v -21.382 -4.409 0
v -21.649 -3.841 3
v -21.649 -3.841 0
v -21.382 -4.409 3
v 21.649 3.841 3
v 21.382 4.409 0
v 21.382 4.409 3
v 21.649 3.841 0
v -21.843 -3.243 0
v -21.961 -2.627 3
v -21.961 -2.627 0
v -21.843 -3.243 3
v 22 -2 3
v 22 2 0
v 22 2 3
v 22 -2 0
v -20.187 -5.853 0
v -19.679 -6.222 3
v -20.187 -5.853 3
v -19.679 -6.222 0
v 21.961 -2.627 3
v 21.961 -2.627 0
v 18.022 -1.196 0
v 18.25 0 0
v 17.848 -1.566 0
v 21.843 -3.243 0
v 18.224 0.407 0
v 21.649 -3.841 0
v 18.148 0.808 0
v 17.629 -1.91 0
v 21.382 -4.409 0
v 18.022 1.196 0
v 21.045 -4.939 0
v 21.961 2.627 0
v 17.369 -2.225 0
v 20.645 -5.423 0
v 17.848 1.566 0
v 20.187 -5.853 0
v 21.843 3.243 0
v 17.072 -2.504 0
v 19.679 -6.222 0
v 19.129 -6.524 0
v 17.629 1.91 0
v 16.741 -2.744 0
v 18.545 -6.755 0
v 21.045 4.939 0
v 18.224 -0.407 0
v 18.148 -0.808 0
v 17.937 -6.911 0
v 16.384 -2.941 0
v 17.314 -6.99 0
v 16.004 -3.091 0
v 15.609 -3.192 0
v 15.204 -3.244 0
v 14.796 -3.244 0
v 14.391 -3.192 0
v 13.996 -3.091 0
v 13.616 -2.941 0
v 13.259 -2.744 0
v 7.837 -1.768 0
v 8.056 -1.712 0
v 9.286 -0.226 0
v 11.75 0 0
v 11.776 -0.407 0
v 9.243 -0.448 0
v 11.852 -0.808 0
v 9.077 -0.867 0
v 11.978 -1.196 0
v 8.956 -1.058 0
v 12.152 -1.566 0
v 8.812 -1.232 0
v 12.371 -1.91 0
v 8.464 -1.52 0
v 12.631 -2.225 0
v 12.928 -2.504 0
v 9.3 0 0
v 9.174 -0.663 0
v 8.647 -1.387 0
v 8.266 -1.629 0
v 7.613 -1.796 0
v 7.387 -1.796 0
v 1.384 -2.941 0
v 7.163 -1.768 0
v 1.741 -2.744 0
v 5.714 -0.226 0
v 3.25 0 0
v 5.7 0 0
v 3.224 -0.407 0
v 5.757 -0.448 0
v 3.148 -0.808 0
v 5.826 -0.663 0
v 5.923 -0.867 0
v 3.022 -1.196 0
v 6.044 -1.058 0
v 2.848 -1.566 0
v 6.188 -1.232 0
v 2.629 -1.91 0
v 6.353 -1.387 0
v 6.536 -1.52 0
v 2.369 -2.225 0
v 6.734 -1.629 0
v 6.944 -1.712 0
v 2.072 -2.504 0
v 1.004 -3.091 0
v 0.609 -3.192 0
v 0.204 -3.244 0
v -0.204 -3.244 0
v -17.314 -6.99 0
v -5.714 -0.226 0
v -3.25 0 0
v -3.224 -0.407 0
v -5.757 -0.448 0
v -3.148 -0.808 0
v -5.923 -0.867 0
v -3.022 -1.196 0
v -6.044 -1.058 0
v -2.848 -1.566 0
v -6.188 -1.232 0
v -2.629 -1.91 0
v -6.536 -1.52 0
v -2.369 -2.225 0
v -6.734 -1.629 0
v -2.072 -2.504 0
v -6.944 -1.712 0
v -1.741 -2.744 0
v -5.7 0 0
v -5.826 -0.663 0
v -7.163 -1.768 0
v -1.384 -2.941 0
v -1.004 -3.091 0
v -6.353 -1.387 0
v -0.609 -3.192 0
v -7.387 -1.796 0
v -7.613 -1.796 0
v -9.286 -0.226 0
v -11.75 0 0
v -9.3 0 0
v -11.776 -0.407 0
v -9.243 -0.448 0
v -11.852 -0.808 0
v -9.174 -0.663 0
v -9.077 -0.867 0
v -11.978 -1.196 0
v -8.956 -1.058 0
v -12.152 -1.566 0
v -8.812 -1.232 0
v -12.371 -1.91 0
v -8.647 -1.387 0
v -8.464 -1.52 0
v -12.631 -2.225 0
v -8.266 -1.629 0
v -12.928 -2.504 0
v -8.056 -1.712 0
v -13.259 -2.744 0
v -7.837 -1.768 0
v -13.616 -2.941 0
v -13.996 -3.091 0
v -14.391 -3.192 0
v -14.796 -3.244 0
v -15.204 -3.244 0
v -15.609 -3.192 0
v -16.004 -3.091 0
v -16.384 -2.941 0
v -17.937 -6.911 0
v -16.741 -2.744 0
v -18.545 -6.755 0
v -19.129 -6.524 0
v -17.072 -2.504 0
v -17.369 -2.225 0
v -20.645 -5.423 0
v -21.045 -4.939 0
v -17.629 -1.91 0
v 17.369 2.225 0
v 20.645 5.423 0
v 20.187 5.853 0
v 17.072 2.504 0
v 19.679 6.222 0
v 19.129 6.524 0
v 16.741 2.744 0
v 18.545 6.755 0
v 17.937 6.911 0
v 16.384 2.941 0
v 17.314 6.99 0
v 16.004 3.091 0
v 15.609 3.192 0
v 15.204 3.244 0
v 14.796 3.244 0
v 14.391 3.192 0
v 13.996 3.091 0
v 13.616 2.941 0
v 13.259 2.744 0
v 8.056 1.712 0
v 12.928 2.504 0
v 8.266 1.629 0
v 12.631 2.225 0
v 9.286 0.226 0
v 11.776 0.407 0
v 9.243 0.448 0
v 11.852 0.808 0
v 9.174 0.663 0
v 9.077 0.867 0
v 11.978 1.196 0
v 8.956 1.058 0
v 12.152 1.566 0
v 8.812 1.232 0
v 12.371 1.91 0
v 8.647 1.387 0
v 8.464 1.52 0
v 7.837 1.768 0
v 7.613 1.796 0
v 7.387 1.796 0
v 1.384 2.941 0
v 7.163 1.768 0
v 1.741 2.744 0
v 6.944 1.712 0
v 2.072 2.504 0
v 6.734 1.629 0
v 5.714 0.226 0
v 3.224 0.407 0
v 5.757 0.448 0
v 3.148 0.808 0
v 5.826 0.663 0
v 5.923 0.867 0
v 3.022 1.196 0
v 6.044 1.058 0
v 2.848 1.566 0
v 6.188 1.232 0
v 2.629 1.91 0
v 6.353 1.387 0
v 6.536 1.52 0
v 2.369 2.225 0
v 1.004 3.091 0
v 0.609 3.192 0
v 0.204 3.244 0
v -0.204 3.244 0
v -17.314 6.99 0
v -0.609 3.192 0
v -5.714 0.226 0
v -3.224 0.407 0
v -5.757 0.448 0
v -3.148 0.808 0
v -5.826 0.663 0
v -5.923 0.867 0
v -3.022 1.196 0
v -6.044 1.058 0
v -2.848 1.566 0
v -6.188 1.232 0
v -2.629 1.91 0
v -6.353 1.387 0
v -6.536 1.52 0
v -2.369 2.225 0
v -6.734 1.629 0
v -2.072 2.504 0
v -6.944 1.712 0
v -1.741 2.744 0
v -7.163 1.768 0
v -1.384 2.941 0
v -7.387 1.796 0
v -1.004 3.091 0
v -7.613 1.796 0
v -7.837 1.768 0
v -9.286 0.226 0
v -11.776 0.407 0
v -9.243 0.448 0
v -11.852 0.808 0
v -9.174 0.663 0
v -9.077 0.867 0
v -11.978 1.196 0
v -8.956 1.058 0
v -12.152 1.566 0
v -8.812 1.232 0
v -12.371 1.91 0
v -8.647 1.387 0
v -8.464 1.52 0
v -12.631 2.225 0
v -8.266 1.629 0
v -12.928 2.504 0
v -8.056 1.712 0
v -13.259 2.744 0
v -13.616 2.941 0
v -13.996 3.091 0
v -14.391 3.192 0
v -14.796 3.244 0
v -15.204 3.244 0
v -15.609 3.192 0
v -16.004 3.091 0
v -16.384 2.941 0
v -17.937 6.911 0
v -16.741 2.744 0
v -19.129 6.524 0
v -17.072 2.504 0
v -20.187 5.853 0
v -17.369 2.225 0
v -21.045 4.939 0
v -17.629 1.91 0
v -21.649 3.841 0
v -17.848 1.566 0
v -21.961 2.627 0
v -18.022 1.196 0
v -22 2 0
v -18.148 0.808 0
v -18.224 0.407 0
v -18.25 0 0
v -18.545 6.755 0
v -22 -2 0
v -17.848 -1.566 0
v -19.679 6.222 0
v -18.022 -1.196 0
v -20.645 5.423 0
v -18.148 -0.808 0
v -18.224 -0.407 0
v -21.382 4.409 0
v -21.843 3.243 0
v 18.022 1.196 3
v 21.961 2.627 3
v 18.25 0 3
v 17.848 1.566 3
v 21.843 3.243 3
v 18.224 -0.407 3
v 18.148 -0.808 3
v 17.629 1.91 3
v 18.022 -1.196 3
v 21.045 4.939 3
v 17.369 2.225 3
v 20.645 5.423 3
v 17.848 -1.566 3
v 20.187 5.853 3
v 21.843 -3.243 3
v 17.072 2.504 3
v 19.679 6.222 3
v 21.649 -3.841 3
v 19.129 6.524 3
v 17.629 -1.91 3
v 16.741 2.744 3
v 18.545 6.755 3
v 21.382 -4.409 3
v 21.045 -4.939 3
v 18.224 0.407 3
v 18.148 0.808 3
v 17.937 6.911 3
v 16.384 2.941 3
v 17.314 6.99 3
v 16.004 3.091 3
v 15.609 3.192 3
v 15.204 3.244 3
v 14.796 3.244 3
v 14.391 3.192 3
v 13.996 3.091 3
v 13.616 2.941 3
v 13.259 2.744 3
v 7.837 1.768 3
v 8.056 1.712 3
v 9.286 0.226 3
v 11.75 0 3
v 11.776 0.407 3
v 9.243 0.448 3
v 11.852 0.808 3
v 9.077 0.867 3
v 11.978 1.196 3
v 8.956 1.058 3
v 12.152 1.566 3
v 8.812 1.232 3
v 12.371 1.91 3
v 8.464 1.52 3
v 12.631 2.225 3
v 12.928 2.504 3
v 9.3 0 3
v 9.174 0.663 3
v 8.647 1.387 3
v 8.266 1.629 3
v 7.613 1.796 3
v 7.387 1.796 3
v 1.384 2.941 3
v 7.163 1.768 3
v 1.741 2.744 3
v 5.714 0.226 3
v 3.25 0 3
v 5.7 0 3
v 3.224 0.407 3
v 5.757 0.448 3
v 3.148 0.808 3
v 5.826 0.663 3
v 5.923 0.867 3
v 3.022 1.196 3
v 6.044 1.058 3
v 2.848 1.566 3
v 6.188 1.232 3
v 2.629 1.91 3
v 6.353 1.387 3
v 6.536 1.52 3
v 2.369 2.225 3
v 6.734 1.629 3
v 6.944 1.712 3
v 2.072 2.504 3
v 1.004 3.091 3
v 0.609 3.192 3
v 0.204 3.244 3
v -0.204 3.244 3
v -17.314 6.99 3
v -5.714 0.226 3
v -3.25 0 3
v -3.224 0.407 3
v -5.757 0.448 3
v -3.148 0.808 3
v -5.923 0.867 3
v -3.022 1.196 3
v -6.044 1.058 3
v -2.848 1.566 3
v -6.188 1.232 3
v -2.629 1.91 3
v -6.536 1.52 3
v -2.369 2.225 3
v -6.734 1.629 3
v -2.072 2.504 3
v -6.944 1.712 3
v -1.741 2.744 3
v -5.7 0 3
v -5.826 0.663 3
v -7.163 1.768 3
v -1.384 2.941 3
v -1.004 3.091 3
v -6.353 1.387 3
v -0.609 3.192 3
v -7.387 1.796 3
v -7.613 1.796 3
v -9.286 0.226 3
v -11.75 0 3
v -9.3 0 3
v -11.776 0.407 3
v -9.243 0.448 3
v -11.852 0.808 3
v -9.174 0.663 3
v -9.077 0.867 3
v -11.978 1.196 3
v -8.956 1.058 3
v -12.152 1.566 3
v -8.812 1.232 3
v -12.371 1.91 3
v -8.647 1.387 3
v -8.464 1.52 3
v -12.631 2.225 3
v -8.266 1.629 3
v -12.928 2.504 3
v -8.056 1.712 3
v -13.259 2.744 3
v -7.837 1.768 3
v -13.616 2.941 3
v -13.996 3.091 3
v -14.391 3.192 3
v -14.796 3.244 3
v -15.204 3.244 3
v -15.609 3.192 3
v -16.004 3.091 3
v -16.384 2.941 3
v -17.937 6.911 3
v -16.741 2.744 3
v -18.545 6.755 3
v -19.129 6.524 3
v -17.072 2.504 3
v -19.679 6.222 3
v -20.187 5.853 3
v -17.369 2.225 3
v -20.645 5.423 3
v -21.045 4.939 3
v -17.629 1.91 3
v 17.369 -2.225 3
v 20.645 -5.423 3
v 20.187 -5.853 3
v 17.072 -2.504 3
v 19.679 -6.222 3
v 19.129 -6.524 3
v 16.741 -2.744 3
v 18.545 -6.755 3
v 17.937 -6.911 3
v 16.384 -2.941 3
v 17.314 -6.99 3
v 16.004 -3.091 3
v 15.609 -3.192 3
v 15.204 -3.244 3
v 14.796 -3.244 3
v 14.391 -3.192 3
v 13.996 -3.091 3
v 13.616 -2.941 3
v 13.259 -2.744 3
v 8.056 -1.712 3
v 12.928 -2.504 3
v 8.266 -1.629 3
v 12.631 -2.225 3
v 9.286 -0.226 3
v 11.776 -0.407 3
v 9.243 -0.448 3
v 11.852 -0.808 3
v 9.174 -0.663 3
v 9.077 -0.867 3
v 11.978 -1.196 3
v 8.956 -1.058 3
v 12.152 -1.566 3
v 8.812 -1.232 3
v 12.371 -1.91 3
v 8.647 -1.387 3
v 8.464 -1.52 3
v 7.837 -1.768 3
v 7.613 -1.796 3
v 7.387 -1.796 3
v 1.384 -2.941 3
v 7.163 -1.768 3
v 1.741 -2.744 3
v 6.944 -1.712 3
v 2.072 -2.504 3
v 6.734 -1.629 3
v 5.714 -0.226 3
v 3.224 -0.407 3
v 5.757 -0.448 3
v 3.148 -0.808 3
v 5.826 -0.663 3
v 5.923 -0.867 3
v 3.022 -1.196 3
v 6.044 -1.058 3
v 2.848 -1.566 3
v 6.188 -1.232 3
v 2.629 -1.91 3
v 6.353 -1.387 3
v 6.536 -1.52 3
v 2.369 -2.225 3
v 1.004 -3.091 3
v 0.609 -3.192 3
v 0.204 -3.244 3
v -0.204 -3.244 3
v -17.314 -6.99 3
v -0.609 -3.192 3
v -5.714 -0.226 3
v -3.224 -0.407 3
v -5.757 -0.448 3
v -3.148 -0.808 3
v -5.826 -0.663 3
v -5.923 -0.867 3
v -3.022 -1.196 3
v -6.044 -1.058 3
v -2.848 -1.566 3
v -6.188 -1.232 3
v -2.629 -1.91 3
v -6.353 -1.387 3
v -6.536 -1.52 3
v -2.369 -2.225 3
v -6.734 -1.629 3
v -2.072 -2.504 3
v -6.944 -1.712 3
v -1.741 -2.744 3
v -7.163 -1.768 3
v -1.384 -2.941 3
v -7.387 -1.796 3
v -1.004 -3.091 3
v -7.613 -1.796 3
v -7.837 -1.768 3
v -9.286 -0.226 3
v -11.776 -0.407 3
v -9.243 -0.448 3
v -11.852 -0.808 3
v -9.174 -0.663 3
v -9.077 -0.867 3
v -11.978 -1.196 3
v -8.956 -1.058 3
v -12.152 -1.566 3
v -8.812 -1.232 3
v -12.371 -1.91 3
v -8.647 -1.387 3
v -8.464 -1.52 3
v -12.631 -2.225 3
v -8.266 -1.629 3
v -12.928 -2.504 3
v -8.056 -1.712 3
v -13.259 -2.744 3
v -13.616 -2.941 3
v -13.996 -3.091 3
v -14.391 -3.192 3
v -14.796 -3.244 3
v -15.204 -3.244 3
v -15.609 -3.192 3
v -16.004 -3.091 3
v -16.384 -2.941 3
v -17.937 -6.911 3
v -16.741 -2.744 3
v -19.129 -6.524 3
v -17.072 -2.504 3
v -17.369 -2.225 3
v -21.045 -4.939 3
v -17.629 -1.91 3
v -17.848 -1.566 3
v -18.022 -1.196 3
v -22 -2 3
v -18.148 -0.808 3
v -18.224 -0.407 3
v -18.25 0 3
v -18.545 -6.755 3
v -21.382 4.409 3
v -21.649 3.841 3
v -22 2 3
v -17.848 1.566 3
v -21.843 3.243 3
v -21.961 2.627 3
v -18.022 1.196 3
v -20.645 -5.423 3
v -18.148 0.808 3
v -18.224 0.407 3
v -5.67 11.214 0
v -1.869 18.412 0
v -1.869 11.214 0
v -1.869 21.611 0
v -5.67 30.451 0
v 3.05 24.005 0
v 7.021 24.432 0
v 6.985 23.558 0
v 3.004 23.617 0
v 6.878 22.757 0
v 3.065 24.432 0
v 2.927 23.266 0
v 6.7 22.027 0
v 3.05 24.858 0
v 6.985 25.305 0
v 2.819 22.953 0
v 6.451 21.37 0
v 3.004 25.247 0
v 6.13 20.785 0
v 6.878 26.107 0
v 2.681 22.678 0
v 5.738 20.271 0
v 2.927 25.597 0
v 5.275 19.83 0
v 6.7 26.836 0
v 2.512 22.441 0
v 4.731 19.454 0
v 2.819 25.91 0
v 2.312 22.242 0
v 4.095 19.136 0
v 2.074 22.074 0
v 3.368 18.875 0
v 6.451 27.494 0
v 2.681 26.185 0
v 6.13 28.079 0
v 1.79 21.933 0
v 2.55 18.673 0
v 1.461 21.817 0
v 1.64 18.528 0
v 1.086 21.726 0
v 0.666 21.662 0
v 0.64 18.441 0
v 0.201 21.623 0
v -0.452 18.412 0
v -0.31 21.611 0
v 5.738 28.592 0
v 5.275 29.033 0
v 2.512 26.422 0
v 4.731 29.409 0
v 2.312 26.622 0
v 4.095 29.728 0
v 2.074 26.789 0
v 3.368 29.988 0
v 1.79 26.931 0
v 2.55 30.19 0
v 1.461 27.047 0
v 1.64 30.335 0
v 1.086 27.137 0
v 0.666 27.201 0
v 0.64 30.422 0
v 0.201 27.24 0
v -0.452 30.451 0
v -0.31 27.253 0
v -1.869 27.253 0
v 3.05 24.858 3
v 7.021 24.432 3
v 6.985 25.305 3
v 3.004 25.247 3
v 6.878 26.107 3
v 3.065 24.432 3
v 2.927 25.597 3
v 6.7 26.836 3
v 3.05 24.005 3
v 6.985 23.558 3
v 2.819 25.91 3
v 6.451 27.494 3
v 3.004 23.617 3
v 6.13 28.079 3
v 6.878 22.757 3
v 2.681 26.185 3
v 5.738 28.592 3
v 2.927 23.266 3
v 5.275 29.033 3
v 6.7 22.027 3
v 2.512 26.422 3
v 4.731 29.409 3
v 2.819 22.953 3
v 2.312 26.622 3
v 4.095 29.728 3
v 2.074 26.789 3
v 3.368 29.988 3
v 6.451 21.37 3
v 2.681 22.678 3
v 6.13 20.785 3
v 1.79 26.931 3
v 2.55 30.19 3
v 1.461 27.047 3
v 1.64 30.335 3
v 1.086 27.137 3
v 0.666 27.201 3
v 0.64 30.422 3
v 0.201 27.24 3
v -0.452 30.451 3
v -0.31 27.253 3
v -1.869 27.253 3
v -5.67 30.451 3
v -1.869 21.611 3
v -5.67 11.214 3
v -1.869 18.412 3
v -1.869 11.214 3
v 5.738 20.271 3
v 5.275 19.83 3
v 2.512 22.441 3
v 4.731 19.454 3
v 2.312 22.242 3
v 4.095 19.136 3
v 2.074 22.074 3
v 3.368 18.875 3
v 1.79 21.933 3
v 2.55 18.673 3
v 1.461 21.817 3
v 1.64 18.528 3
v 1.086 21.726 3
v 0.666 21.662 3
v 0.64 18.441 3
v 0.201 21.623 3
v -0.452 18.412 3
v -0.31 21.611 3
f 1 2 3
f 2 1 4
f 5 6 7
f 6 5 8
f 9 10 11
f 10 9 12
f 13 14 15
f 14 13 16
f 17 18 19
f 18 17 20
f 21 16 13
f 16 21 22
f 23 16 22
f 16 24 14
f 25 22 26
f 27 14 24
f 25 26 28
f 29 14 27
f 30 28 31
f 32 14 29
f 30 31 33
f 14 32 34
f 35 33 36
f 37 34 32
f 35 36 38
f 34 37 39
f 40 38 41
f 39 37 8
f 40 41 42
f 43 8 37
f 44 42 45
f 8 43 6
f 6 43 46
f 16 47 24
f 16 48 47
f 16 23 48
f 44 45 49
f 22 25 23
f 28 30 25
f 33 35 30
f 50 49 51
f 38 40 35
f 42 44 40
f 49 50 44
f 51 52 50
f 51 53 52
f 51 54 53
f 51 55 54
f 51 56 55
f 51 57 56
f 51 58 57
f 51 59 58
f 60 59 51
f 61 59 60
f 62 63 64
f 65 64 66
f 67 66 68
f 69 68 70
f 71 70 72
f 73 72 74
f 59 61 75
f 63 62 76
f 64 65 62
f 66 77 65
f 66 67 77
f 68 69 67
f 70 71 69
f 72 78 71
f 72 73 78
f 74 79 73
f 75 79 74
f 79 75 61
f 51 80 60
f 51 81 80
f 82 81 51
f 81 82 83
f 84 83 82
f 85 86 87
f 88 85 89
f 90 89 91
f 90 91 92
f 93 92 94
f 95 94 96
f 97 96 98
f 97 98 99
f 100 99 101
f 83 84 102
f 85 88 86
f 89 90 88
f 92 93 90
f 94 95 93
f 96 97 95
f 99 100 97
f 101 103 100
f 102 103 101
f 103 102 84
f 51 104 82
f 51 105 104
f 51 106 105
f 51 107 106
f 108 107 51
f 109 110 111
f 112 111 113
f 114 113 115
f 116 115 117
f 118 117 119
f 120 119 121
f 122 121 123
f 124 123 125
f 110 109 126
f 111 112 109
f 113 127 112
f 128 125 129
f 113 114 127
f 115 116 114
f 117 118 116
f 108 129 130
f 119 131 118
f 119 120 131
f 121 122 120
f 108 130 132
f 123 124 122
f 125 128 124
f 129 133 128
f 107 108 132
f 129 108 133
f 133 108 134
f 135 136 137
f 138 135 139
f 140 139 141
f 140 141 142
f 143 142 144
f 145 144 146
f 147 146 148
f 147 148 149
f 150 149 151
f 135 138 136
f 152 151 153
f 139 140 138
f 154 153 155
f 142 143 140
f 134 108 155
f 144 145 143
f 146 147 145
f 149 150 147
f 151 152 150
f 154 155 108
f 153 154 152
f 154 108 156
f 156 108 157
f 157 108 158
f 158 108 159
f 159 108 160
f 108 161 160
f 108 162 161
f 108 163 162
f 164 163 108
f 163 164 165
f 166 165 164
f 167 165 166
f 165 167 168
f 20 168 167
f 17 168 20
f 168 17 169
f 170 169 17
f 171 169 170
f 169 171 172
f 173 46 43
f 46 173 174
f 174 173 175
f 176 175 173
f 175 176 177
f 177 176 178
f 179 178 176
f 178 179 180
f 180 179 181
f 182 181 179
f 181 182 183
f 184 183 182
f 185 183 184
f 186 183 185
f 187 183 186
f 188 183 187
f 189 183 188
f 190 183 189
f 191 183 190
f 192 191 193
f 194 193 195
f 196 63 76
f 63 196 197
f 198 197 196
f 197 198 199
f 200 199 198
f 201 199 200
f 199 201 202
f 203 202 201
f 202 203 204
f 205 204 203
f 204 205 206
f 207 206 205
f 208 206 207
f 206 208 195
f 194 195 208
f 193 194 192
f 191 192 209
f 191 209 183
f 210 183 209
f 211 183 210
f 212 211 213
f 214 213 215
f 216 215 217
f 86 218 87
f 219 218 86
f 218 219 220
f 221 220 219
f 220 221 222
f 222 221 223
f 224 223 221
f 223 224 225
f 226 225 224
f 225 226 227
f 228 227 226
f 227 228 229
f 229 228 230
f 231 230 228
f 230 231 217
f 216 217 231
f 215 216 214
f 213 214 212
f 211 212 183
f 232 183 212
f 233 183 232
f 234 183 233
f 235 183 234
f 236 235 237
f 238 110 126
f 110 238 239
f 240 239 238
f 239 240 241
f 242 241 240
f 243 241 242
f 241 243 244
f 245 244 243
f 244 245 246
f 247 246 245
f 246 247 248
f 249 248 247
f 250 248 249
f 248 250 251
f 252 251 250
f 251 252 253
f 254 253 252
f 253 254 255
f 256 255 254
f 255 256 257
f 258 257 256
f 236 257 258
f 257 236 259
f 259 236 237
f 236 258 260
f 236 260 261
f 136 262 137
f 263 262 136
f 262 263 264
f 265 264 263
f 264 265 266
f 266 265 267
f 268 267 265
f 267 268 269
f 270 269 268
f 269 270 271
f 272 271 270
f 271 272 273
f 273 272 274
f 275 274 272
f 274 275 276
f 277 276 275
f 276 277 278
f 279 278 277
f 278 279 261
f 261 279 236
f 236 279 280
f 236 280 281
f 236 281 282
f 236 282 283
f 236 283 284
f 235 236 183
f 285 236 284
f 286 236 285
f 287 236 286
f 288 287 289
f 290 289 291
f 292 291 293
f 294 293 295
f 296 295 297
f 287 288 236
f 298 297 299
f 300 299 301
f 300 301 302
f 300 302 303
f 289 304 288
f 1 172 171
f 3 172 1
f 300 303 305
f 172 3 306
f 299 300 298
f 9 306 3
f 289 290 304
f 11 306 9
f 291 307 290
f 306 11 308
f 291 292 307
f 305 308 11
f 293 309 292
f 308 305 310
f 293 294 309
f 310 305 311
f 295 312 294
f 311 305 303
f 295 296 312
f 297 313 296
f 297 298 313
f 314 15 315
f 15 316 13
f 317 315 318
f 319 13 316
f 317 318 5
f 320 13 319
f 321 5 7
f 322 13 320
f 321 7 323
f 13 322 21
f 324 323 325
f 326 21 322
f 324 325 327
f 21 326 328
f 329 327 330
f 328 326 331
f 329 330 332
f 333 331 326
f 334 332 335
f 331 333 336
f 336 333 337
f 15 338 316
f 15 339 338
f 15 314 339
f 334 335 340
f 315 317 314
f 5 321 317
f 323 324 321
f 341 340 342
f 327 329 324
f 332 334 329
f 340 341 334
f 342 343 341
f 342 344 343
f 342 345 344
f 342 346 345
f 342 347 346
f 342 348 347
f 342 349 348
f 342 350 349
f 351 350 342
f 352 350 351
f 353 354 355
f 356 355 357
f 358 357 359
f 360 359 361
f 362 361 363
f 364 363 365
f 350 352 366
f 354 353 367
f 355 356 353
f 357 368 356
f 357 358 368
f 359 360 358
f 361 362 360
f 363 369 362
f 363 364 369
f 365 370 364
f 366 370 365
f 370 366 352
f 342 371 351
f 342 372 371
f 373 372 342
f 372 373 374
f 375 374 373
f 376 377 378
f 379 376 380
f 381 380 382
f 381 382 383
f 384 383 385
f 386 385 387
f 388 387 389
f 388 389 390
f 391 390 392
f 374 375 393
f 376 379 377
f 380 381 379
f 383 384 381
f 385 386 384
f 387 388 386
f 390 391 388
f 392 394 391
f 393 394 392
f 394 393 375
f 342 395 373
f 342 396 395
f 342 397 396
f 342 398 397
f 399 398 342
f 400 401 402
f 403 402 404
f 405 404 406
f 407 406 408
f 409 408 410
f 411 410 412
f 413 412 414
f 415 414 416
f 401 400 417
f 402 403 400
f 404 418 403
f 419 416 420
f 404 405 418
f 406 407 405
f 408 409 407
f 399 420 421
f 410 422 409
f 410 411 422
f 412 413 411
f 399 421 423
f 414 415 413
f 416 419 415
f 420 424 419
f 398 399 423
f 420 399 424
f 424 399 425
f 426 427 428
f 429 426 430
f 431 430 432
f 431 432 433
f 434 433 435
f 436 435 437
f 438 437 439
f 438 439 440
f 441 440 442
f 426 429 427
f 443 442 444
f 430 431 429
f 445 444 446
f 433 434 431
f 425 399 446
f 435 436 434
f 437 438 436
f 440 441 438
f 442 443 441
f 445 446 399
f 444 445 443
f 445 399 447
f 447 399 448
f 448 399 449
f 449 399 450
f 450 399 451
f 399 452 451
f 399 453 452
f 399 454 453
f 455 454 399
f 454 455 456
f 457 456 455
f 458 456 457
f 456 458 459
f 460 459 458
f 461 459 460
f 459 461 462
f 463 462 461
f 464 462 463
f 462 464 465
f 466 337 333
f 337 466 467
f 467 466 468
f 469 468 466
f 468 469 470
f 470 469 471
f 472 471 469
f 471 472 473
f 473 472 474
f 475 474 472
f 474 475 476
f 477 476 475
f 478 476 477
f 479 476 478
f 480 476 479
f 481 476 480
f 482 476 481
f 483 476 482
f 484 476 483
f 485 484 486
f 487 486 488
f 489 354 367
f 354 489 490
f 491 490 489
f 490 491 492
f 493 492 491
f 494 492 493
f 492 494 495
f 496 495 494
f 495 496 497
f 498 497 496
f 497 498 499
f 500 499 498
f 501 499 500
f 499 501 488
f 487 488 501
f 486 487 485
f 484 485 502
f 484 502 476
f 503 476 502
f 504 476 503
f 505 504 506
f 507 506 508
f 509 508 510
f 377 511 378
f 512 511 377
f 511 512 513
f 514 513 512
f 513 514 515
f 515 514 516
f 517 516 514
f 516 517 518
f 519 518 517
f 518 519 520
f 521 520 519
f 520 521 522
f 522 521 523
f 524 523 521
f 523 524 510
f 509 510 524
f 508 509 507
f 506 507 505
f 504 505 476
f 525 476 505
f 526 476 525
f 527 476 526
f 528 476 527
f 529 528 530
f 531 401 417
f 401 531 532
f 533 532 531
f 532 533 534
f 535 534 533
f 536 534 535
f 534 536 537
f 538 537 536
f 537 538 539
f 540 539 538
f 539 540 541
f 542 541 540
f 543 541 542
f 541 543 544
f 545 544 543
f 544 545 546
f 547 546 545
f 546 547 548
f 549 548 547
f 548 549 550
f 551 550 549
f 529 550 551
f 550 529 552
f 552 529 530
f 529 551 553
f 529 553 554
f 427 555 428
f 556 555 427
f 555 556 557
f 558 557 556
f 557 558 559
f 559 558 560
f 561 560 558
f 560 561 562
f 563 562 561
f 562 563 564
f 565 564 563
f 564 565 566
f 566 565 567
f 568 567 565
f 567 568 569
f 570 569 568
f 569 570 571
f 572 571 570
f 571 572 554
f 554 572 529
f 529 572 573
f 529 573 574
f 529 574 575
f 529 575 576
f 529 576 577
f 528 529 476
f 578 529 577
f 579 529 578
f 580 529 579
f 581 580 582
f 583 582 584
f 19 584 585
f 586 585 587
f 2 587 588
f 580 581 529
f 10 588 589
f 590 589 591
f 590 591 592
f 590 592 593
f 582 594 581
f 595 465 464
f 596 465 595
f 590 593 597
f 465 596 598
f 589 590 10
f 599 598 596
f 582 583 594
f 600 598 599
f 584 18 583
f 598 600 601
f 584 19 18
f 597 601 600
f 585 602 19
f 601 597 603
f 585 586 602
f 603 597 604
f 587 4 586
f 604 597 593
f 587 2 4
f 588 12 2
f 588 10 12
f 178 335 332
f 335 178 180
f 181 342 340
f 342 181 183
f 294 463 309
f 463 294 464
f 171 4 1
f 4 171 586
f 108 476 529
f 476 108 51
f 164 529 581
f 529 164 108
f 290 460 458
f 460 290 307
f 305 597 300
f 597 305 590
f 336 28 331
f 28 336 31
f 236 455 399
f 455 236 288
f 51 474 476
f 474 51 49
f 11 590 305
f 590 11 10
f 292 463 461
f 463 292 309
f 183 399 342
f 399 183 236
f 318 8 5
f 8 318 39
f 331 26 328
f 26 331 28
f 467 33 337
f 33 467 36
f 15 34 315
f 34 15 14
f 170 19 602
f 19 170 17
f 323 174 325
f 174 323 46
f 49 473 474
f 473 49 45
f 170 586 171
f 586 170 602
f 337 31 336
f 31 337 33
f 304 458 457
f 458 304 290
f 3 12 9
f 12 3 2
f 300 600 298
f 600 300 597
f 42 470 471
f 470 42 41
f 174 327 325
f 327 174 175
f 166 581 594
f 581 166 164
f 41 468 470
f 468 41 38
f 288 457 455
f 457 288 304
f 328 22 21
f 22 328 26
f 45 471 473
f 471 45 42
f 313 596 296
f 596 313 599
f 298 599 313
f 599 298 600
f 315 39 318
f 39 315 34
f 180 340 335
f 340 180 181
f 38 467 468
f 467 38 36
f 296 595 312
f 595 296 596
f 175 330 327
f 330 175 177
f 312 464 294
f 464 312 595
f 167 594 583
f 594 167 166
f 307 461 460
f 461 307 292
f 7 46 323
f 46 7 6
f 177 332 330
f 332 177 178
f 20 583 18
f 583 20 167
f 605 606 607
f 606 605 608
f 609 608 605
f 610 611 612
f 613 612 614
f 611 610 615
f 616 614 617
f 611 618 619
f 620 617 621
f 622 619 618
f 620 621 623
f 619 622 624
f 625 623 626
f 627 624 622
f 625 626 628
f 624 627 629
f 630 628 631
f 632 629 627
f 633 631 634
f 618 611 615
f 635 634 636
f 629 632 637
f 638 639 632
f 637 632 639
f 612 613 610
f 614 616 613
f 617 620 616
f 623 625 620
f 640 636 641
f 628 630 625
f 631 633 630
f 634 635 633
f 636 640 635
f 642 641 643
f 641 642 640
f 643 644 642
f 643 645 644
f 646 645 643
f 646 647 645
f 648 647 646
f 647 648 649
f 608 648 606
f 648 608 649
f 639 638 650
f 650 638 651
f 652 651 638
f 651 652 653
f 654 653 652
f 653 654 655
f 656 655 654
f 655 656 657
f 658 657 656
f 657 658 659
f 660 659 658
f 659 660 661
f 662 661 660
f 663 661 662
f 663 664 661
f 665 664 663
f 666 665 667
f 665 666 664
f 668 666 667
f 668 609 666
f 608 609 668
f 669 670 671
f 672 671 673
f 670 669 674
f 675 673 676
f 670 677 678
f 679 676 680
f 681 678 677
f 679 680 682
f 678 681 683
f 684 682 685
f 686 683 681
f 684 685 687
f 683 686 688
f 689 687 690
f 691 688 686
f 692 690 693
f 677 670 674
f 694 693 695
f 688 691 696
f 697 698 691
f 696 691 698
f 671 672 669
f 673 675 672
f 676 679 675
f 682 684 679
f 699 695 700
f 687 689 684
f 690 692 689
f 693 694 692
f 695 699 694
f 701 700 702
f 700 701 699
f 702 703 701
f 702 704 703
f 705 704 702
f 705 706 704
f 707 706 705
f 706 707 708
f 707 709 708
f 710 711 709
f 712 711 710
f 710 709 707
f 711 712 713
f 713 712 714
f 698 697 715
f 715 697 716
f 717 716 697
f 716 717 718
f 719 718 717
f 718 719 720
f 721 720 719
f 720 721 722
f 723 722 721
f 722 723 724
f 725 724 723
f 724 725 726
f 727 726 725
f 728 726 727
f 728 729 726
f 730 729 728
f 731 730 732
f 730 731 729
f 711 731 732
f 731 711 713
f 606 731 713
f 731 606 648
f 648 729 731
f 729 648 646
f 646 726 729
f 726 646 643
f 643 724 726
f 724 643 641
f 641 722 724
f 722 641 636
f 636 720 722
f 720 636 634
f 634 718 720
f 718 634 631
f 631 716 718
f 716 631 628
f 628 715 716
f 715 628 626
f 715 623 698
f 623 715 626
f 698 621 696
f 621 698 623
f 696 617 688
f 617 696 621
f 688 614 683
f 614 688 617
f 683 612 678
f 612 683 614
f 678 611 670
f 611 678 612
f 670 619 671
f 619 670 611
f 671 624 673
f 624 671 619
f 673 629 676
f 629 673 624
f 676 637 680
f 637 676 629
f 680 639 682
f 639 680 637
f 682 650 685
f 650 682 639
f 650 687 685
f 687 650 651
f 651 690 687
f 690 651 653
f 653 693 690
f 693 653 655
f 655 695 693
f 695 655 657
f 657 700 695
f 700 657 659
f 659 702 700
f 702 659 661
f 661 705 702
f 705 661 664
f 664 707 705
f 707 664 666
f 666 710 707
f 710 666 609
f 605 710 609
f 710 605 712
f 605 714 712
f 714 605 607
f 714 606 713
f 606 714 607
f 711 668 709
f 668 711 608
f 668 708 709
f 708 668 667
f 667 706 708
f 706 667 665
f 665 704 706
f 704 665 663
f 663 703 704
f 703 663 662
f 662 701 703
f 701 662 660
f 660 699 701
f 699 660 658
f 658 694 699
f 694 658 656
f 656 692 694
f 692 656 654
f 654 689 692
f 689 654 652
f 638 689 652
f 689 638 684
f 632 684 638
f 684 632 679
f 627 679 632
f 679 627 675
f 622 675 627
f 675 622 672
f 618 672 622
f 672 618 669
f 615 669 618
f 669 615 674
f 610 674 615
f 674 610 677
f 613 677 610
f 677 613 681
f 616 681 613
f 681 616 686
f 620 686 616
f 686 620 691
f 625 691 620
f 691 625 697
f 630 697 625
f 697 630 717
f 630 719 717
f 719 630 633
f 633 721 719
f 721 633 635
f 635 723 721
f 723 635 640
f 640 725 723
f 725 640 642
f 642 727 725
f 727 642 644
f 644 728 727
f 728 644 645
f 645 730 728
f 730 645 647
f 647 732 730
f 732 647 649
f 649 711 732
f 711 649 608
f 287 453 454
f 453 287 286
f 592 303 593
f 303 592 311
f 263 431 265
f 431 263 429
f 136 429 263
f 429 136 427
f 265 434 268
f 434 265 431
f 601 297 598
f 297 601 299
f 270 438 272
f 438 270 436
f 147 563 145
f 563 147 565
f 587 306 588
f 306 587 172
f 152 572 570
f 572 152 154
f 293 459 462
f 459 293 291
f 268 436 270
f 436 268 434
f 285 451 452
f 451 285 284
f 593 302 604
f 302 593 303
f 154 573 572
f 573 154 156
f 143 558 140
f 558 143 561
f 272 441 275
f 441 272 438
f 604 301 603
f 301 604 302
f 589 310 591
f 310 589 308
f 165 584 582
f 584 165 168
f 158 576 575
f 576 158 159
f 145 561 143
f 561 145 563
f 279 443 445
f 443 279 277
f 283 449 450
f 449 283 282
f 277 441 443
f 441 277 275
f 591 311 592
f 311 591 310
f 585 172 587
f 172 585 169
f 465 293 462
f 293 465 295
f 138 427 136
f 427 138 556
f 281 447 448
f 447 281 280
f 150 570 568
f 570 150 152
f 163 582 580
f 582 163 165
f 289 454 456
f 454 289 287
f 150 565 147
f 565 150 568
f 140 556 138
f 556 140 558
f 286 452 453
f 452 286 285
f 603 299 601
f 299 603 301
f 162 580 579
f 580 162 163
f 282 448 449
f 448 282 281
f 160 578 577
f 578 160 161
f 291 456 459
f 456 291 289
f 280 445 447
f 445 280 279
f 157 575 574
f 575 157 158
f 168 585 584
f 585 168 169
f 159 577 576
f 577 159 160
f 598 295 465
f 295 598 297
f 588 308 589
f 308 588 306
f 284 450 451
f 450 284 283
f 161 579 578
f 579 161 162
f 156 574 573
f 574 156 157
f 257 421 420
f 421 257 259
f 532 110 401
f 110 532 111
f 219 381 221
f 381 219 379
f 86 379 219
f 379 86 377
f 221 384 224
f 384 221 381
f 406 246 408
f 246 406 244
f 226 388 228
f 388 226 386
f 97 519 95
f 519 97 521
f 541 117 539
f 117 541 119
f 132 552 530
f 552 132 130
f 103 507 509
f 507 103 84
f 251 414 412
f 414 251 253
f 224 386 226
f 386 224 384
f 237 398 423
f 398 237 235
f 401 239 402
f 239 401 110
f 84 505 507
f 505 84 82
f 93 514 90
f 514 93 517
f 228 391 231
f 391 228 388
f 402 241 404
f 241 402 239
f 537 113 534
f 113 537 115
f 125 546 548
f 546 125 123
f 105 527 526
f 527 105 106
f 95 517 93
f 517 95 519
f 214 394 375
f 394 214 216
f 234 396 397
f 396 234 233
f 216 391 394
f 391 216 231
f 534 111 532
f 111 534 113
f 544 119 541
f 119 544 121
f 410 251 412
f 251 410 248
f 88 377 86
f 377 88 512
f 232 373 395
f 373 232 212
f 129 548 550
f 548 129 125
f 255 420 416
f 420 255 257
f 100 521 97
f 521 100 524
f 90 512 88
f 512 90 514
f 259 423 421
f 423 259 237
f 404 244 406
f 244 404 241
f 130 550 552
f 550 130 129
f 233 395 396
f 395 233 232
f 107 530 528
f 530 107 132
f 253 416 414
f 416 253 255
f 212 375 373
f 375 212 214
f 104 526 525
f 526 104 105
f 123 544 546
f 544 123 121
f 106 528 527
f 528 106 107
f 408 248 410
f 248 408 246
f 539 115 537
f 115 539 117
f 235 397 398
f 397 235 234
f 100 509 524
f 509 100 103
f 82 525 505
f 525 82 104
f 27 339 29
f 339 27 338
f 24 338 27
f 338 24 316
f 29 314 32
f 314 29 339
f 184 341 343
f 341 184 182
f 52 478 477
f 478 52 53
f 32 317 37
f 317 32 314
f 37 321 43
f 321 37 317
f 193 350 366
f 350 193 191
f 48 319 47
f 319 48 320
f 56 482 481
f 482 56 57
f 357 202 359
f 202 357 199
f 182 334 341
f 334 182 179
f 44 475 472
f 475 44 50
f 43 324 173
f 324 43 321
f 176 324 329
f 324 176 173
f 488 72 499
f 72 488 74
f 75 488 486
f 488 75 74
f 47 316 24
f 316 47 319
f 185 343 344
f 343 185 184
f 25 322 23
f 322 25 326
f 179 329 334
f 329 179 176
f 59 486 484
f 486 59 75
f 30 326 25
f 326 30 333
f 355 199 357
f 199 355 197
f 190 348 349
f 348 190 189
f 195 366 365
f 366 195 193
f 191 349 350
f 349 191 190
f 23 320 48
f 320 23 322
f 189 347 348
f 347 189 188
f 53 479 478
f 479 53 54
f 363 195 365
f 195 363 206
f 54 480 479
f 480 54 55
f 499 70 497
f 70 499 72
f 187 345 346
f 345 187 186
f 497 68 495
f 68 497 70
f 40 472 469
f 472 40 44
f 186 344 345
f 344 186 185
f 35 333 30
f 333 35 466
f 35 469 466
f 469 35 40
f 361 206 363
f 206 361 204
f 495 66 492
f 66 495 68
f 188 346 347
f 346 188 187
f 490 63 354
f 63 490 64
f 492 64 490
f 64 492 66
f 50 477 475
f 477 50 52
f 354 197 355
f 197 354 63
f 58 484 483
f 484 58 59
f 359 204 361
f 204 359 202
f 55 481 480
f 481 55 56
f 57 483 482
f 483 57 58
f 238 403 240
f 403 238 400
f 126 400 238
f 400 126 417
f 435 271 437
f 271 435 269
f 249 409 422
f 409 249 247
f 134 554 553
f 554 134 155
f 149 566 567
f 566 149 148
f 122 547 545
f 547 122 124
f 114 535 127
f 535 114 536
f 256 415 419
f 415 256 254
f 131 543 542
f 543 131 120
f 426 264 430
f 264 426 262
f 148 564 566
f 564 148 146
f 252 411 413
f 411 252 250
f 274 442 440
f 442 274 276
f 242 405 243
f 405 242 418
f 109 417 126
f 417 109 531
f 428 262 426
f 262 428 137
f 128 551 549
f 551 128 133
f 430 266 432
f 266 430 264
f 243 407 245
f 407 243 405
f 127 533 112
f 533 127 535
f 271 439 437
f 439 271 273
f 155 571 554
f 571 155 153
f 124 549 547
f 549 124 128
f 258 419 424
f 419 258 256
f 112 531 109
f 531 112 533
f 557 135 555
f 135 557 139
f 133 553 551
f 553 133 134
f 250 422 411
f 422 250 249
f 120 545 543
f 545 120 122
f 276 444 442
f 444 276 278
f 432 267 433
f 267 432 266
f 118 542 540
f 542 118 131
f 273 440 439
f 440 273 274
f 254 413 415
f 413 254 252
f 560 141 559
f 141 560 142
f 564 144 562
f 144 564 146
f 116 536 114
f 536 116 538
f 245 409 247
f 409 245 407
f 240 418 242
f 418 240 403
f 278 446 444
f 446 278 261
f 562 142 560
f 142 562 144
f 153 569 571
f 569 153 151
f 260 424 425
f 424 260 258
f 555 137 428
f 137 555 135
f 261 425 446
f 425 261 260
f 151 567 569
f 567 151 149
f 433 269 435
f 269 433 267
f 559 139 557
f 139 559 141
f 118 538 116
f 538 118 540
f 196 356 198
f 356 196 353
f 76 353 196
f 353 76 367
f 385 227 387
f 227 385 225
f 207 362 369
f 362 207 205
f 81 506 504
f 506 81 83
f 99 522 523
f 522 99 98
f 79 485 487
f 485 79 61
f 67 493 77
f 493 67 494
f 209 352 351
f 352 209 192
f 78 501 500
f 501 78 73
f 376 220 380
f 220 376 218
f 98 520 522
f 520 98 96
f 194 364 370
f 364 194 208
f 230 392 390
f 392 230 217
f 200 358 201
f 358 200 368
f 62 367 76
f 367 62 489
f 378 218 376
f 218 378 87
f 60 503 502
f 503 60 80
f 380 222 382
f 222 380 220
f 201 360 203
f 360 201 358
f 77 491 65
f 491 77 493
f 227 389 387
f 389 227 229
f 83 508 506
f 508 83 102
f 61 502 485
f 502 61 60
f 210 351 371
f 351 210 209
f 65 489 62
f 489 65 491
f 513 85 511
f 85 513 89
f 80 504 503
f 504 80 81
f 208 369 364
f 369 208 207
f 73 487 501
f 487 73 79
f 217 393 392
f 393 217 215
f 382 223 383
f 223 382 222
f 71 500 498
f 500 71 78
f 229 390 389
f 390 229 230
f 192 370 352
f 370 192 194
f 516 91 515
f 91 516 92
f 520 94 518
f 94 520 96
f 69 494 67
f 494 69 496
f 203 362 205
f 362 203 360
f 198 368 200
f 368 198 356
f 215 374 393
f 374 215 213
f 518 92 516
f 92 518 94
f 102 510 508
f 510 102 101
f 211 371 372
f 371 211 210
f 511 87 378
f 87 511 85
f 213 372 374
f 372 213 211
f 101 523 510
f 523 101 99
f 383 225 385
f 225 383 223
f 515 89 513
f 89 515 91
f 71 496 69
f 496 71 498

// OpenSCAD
$fn = 50;


difference() {
	union() {
		hull() {
			translate(v = [-17.0000000000, 2.0000000000, 0]) {
				cylinder(h = 3, r = 5);
			}
			translate(v = [17.0000000000, 2.0000000000, 0]) {
				cylinder(h = 3, r = 5);
			}
			translate(v = [-17.0000000000, -2.0000000000, 0]) {
				cylinder(h = 3, r = 5);
			}
			translate(v = [17.0000000000, -2.0000000000, 0]) {
				cylinder(h = 3, r = 5);
			}
		}
		translate(v = [0, 30.0000000000, 0]) {
			linear_extrude(height = 3) {
				text(font = "DejaVu Sans Mono:style=Bold", halign = "center", size = 19.0000000000, text = "P", valign = "top");
			}
		}
	}
	union() {
		translate(v = [-15.0000000000, 0.0000000000, 0]) {
			translate(v = [0, 0, -100]) {
				cylinder(h = 200, r = 3.2500000000);
			}
		}
		translate(v = [0, 0, -100]) {
			cylinder(h = 200, r = 3.2500000000);
		}
		translate(v = [15.0000000000, 0.0000000000, 0]) {
			translate(v = [0, 0, -100]) {
				cylinder(h = 200, r = 3.2500000000);
			}
		}
		translate(v = [-15.0000000000, 0.0000000000, 0]) {
			translate(v = [0, 0, -100]) {
				cylinder(h = 200, r = 1.8000000000);
			}
		}
		translate(v = [-7.5000000000, 0.0000000000, 0]) {
			translate(v = [0, 0, -100]) {
				cylinder(h = 200, r = 1.8000000000);
			}
		}
		translate(v = [0, 0, -100]) {
			cylinder(h = 200, r = 1.8000000000);
		}
		translate(v = [7.5000000000, 0.0000000000, 0]) {
			translate(v = [0, 0, -100]) {
				cylinder(h = 200, r = 1.8000000000);
			}
		}
		translate(v = [15.0000000000, 0.0000000000, 0]) {
			translate(v = [0, 0, -100]) {
				cylinder(h = 200, r = 1.8000000000);
			}
		}
	}
}
